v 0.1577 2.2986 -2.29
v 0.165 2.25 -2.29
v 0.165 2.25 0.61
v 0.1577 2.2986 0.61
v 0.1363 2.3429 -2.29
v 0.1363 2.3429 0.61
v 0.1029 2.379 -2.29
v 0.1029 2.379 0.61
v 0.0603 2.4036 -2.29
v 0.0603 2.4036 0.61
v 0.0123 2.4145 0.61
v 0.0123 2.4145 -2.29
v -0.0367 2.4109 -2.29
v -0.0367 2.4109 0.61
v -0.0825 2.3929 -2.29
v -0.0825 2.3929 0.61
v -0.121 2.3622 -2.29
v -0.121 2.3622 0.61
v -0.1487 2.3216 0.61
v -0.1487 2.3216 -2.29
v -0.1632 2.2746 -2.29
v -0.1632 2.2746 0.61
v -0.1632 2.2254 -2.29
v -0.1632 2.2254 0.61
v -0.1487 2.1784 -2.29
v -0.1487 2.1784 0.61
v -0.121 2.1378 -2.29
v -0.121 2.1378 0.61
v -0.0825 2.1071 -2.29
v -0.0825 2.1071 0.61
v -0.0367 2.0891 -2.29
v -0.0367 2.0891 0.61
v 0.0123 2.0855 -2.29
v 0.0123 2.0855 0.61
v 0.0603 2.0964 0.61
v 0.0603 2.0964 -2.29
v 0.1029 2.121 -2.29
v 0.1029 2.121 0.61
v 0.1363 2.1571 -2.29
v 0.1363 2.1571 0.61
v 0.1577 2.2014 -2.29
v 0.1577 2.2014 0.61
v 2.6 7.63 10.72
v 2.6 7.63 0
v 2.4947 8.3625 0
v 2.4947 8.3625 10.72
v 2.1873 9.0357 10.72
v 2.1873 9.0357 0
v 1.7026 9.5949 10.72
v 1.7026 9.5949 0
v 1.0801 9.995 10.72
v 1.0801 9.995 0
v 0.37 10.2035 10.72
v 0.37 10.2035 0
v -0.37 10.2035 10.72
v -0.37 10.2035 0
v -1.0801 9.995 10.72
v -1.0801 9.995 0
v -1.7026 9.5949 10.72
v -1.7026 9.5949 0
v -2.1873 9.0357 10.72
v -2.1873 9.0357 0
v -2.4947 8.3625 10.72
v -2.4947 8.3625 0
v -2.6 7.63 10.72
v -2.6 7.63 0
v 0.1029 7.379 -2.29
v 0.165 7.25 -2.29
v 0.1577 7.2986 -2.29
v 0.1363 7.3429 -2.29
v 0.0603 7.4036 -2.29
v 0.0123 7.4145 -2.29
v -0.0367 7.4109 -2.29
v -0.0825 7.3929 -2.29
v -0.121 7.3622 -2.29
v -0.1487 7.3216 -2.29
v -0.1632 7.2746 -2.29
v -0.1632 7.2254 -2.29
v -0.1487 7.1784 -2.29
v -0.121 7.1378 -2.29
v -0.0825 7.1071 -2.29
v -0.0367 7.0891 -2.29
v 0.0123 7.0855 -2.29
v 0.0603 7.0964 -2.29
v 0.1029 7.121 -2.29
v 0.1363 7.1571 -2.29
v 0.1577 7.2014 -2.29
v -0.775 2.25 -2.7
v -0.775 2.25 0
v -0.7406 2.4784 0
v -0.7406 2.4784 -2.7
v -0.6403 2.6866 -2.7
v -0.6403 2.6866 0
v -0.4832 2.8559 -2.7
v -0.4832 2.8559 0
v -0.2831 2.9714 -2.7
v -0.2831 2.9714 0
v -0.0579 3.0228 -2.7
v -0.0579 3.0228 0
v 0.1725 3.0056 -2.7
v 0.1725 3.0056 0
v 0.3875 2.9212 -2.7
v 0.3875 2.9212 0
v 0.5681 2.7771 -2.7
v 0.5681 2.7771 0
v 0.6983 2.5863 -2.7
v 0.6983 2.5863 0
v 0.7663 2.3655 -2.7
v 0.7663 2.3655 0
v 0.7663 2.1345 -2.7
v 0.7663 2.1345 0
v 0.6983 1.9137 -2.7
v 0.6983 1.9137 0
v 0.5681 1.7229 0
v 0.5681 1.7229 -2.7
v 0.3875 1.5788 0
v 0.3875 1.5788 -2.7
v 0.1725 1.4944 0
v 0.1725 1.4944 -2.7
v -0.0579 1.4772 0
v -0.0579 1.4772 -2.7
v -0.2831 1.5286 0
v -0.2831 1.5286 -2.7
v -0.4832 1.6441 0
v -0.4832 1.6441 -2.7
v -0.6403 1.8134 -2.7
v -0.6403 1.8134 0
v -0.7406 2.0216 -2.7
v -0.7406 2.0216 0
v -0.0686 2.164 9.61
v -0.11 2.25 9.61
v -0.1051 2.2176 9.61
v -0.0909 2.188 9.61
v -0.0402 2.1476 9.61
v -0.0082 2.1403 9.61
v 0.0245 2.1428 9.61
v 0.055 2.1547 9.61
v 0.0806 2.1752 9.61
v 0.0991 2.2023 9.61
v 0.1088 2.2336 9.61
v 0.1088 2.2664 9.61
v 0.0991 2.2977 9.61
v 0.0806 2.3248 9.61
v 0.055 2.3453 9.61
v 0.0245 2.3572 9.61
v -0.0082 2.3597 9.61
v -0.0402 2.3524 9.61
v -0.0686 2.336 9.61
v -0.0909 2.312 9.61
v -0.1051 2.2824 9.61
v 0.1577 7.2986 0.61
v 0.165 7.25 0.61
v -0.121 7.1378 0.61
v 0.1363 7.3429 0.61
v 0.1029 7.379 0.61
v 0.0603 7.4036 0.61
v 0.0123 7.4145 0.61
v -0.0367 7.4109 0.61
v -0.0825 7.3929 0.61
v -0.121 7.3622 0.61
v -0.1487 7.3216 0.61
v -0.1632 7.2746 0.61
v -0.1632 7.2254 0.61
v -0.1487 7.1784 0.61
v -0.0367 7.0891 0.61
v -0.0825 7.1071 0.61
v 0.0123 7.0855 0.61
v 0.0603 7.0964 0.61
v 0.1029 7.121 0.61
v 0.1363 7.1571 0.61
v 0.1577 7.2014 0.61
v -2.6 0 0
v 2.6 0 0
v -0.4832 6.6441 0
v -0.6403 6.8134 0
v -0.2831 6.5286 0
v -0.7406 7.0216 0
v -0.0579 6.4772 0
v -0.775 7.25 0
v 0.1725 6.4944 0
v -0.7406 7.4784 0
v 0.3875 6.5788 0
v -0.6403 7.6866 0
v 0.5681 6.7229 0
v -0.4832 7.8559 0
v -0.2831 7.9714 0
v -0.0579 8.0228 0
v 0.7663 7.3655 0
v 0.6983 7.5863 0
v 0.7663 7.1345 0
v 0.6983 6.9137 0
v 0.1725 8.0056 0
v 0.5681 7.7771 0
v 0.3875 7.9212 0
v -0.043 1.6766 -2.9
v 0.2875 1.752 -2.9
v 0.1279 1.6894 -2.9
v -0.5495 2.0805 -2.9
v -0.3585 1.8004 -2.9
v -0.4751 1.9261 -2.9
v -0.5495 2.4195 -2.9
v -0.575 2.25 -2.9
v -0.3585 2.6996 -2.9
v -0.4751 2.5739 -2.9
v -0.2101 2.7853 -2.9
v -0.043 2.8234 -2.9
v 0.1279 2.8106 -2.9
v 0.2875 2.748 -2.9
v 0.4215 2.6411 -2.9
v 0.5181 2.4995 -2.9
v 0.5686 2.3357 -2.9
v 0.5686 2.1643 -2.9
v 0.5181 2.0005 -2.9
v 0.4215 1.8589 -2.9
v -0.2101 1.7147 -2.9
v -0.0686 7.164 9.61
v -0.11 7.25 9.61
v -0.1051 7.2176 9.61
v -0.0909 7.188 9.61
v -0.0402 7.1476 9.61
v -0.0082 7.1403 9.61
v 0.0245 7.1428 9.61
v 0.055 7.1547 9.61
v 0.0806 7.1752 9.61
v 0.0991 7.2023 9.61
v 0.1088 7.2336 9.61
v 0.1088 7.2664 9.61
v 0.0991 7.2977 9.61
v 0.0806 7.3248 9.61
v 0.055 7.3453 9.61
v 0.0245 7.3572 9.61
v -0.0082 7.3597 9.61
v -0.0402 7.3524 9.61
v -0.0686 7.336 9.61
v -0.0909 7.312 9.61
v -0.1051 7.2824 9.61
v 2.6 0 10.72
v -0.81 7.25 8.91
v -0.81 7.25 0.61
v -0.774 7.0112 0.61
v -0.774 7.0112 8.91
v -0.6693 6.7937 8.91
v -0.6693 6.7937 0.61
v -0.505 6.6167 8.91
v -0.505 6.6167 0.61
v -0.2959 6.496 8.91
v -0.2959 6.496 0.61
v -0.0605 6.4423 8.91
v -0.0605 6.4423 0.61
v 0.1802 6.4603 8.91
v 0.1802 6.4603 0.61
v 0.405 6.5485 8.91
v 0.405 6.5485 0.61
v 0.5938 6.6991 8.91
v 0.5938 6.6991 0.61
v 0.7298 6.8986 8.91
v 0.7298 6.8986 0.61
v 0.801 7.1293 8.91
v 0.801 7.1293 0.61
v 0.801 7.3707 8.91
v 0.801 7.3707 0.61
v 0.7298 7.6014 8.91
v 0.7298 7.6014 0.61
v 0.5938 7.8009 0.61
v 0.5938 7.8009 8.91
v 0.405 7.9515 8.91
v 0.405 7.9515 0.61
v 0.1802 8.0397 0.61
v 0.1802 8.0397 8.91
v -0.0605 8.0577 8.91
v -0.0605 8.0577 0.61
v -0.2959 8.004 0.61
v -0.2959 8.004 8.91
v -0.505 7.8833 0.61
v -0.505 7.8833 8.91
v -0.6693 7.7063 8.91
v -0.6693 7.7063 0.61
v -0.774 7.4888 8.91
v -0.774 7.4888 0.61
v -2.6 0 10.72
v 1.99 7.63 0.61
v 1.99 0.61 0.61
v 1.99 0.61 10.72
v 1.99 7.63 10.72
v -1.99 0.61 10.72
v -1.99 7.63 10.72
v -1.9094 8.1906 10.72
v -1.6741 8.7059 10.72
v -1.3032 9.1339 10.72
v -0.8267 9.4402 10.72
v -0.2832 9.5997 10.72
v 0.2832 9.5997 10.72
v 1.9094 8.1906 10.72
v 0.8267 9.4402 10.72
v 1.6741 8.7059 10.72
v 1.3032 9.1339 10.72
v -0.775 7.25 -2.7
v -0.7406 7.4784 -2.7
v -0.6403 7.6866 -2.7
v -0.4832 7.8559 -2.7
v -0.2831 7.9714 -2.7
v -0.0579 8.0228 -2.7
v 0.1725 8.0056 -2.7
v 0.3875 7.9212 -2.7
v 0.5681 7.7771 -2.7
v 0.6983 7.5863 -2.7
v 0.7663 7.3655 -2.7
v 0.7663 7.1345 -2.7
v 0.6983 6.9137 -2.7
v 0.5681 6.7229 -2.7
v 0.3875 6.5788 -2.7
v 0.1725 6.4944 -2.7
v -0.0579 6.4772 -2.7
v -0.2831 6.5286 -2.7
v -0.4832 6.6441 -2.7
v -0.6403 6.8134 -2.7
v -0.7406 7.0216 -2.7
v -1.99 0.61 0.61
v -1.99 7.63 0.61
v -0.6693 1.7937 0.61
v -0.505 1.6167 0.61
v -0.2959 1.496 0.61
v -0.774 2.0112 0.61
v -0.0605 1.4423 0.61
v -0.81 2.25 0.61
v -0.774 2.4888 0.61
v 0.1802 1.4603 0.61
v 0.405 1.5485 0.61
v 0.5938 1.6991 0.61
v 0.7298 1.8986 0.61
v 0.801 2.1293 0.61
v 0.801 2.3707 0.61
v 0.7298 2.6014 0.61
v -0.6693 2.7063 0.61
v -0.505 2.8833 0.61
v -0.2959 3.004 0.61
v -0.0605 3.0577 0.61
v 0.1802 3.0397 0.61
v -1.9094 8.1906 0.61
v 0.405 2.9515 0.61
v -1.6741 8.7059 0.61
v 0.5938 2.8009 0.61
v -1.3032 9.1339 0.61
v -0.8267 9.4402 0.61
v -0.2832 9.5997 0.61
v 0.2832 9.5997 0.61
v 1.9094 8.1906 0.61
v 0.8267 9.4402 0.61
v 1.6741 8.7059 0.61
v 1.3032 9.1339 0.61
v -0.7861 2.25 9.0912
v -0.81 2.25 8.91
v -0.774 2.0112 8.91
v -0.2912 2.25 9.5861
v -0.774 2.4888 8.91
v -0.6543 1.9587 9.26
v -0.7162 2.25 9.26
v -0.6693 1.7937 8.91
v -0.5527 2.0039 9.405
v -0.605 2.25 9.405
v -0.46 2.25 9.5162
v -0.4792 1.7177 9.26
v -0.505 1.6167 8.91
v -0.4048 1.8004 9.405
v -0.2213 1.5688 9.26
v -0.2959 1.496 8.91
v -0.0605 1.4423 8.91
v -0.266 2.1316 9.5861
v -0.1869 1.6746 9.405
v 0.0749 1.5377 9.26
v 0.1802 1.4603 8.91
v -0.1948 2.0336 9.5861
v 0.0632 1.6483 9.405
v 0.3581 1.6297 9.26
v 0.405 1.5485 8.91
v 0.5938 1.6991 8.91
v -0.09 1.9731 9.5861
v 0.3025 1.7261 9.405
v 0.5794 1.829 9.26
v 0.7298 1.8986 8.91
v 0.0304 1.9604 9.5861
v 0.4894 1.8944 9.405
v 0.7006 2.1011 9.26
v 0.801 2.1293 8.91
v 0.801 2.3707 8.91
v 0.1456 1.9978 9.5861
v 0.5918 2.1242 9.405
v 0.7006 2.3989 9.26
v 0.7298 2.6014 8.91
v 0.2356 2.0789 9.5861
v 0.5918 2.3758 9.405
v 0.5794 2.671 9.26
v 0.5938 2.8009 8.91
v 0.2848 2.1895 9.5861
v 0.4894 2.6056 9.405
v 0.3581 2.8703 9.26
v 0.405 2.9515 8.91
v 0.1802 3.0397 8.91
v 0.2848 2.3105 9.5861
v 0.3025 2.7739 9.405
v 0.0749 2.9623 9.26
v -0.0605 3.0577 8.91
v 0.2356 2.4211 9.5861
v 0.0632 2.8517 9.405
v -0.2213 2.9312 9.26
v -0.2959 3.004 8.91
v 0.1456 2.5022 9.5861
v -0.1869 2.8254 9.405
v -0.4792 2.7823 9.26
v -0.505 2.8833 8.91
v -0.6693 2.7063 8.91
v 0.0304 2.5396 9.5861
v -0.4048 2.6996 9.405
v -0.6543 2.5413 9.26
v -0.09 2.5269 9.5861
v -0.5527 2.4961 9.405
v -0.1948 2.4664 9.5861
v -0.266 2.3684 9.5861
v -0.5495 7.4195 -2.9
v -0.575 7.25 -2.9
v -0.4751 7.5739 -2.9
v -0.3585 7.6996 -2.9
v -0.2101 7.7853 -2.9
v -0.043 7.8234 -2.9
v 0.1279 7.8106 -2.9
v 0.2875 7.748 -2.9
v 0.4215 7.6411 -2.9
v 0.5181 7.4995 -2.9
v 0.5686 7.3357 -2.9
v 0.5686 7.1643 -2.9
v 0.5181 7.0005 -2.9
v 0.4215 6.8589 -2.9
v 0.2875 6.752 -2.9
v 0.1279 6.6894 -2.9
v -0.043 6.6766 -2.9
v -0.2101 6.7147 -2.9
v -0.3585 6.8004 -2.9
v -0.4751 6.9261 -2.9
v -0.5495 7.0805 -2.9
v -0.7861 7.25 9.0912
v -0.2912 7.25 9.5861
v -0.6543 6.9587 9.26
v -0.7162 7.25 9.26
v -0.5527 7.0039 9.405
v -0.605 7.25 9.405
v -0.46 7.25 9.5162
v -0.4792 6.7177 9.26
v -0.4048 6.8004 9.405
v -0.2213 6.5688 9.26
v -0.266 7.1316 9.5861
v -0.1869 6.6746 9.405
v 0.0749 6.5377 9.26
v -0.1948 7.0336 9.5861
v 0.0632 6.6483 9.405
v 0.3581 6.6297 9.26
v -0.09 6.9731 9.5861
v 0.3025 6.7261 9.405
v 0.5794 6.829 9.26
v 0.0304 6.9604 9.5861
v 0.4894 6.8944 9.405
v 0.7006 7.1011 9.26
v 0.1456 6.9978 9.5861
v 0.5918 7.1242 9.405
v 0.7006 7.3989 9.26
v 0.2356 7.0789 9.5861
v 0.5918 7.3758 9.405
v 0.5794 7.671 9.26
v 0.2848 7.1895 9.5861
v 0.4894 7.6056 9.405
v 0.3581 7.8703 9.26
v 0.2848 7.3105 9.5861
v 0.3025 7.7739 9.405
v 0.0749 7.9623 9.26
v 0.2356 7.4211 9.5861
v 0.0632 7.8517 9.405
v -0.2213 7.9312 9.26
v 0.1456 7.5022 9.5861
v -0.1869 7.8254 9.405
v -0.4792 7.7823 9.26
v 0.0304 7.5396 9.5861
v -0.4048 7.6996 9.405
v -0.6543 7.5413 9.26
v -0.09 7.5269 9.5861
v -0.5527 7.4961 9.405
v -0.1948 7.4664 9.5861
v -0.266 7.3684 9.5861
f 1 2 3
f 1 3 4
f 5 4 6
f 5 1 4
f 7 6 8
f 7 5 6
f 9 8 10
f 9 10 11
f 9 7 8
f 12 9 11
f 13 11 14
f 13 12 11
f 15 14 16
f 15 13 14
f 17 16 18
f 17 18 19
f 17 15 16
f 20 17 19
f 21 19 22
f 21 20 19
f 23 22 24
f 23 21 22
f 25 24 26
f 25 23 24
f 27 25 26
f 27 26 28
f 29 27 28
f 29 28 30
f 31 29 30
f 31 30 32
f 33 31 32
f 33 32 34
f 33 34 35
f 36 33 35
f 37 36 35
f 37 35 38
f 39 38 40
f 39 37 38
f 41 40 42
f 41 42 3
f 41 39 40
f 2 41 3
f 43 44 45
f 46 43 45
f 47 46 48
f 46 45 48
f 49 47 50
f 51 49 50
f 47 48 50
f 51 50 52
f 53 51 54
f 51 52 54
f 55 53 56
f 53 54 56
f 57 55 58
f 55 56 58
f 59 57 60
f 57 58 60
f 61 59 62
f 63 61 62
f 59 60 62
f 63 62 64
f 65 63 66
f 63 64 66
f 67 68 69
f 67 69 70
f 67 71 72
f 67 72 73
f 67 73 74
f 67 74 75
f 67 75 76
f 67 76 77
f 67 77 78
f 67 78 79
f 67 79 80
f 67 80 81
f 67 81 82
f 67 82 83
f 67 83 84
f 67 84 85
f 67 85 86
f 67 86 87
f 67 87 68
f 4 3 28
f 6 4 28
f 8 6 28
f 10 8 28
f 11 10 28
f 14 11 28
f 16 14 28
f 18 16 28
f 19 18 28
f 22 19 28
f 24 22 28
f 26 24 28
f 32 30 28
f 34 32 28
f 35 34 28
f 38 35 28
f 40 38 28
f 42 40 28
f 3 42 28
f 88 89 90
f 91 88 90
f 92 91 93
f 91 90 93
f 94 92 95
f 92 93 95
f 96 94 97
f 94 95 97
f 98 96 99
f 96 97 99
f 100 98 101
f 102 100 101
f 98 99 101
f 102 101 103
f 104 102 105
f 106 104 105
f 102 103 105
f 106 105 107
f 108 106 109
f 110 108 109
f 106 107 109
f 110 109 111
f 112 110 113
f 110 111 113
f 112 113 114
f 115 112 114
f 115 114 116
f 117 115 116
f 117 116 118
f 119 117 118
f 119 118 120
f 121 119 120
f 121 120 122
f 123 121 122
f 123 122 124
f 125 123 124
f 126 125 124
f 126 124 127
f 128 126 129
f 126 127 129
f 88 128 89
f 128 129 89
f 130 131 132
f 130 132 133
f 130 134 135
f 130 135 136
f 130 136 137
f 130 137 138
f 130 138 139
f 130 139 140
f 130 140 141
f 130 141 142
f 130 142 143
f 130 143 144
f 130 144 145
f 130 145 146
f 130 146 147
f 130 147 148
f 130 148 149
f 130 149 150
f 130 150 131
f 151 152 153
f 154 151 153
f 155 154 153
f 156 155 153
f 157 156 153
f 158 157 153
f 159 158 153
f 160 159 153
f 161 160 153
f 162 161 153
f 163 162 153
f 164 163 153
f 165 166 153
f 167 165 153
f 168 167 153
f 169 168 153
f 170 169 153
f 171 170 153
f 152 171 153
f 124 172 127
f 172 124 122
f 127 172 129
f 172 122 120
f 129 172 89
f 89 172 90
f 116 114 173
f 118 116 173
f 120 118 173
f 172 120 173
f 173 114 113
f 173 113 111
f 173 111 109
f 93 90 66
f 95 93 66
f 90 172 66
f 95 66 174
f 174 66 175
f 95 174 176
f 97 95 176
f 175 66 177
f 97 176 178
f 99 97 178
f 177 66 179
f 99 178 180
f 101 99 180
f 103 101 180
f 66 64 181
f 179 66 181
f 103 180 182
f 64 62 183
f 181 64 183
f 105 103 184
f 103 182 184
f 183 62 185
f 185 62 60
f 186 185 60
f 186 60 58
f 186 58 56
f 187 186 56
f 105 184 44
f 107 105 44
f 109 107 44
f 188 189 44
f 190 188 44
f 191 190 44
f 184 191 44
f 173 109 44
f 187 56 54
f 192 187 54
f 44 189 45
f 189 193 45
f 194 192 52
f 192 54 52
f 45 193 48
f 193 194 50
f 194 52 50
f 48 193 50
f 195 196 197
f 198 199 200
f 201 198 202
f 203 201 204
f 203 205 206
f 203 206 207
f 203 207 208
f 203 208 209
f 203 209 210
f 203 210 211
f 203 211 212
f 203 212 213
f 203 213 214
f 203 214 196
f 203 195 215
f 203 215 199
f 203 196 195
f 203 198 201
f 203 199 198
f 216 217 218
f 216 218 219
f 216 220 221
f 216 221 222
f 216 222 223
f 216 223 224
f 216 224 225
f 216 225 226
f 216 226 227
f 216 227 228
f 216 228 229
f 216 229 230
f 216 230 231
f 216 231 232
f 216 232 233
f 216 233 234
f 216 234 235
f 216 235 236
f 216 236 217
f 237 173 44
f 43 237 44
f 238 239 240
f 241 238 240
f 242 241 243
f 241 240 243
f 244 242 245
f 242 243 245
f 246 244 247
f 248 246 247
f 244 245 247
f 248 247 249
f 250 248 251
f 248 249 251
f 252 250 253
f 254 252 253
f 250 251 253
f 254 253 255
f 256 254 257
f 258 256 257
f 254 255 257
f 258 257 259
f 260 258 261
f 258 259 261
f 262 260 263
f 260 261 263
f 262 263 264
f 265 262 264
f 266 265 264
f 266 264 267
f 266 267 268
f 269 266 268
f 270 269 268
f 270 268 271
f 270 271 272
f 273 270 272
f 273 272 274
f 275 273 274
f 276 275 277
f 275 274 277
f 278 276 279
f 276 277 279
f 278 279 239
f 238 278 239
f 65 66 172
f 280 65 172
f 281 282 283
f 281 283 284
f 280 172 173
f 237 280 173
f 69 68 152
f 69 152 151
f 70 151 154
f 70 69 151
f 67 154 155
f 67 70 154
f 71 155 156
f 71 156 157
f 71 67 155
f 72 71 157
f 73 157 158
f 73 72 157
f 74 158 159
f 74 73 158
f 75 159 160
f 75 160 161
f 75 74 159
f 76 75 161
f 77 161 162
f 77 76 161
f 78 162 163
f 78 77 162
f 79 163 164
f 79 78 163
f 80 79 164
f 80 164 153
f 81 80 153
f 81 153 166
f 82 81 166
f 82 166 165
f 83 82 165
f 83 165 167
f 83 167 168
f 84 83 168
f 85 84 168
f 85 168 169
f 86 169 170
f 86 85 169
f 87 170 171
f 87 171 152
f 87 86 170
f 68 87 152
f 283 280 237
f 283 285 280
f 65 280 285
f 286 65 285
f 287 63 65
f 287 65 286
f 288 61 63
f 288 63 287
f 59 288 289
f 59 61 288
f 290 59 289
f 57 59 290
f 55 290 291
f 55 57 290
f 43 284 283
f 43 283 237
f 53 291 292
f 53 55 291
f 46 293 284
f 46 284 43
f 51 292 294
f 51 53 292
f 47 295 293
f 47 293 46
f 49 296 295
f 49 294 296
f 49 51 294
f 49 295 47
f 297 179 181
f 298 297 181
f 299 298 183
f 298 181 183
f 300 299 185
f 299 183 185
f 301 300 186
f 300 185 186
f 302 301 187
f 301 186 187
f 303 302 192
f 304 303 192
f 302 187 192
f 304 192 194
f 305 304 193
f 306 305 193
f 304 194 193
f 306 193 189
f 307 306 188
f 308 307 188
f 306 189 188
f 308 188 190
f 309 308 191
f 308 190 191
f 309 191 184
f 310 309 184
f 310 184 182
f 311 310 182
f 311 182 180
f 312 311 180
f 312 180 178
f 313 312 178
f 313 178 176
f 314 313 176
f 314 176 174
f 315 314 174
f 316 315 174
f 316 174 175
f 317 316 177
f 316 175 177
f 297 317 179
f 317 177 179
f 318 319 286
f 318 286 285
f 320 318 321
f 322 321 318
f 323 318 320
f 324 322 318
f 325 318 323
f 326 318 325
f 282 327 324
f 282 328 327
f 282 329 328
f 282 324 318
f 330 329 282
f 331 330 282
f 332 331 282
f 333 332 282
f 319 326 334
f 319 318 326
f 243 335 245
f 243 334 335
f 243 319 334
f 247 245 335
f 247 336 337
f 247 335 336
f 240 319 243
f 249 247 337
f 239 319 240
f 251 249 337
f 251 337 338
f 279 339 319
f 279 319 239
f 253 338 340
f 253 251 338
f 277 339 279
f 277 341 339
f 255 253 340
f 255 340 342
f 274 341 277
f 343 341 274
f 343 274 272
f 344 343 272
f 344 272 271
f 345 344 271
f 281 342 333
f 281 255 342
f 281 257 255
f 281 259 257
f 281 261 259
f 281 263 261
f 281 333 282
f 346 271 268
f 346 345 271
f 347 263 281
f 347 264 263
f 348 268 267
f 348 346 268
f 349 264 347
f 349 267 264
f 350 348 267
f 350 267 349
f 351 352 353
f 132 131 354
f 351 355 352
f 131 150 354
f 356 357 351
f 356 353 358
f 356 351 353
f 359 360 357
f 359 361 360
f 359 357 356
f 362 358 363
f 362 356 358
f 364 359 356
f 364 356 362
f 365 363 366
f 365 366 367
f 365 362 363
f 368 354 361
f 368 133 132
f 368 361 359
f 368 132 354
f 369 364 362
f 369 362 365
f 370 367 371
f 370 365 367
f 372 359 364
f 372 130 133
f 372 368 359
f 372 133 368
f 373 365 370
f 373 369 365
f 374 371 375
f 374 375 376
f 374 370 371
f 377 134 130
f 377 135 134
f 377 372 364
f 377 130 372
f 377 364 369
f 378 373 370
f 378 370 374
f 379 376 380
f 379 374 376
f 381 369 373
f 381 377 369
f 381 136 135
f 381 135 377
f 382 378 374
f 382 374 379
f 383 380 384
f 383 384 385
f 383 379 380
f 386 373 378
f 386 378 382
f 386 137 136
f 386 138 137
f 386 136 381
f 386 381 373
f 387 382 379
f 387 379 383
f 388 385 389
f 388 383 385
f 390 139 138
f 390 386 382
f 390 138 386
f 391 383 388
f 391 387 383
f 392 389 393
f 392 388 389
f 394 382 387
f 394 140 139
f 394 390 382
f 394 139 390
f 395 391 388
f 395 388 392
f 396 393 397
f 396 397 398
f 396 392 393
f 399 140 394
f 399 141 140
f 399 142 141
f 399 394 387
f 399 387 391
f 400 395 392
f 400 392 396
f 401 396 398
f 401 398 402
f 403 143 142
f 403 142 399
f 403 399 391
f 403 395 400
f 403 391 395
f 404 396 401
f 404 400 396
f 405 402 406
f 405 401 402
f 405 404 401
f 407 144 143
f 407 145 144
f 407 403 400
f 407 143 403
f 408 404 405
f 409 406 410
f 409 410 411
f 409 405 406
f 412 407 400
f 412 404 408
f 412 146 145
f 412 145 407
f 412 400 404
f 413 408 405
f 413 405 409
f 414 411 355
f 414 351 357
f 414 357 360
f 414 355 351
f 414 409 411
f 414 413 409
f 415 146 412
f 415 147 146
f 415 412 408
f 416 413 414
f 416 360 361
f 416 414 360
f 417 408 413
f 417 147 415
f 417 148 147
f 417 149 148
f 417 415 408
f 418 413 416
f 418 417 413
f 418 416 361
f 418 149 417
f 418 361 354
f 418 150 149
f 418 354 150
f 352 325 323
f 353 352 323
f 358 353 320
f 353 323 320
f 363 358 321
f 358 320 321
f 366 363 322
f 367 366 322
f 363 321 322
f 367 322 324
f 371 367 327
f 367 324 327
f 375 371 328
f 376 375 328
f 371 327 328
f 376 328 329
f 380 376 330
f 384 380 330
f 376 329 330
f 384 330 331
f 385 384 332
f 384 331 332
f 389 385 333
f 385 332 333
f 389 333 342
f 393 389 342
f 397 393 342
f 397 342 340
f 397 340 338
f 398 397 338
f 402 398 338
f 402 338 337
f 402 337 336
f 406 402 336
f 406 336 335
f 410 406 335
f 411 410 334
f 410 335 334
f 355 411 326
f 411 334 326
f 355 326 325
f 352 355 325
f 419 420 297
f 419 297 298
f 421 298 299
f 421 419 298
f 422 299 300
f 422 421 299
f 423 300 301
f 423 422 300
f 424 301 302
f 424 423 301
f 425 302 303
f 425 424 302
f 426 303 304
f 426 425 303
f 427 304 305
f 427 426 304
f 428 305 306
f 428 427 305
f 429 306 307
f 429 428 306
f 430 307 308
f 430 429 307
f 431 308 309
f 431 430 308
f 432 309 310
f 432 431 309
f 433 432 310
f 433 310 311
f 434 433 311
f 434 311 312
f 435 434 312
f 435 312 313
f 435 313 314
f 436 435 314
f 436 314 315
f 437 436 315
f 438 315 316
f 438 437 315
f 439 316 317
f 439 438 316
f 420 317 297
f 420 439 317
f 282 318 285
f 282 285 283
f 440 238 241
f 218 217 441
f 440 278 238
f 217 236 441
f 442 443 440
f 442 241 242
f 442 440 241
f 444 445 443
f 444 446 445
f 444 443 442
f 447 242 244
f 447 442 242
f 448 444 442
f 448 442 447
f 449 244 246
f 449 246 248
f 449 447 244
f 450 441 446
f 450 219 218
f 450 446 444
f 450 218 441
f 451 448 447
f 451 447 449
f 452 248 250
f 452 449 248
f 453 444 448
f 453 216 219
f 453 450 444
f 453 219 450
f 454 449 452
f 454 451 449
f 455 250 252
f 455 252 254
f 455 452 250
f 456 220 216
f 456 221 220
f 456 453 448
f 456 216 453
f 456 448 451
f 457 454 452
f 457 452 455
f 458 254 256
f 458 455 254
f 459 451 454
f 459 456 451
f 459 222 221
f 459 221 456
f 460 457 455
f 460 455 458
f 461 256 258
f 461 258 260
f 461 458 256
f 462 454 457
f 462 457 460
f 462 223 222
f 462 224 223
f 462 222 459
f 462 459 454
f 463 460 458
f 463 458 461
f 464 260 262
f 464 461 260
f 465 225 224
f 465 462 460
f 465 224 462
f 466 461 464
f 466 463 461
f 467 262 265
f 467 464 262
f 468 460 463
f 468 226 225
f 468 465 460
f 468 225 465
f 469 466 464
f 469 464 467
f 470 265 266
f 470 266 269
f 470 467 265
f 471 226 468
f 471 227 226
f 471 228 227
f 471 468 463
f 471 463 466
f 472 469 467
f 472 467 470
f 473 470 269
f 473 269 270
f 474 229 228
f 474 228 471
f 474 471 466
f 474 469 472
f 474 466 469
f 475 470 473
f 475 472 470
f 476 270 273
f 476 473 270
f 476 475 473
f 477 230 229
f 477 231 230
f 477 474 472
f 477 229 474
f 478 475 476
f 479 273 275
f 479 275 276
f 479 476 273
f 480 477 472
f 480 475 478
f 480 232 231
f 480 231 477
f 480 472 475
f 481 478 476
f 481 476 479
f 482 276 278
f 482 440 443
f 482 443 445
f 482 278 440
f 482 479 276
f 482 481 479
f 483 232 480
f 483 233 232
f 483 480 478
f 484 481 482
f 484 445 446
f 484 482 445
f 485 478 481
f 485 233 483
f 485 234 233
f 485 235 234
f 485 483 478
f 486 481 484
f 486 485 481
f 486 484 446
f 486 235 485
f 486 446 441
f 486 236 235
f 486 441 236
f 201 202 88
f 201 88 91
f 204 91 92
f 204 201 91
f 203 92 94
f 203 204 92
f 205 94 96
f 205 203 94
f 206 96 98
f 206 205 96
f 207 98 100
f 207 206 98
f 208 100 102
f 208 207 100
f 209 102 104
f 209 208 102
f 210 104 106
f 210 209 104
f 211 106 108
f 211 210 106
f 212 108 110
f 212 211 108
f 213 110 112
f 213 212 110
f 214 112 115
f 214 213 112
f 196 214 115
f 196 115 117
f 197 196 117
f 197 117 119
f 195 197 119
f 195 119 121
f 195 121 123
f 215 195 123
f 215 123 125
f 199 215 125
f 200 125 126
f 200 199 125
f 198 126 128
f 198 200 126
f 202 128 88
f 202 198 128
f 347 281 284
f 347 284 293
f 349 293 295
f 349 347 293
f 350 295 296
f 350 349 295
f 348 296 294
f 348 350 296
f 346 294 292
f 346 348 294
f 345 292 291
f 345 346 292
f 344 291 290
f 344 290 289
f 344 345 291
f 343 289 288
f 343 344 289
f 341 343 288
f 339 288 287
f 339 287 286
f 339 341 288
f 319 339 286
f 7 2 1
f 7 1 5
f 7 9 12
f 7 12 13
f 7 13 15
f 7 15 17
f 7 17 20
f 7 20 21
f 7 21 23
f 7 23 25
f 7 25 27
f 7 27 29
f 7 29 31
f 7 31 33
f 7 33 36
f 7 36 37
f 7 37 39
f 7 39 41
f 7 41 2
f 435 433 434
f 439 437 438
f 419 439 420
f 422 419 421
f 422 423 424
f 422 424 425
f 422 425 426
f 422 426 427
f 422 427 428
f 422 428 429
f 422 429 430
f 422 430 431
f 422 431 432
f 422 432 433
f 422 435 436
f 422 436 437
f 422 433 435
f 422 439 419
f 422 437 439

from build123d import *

# Parameters (mm, degrees)
SALIENTE_EXTRUIR1_DEPTH = 10.72
CROQUIS2_R              = 0.775
SALIENTE_EXTRUIR2_DEPTH = 2.9
CHAFL_N1_SIZE           = 0.2
VACIADO1_START          = 0.61
VACIADO1_DEPTH          = 10.11
VACIADO1_START_2        = -2.29
VACIADO1_2_OUTLINE_R    = 0.165
VACIADO1_2_DEPTH        = 2.9
CROQUIS4_R              = 0.81
SALIENTE_EXTRUIR4_DEPTH = 9
REDONDEO1_R             = 0.7


# Read off the part's stored shape, not the designer's step: Vaciado1
with BuildPart() as part:
    # Croquis1 → Saliente-Extruir1 (new body)
    with BuildSketch(Plane.XY):
        with BuildLine():
            Line((-2.6, 7.63), (-2.6, 0))
            Line((-2.6, 0), (2.6, 0))
            Line((2.6, 0), (2.6, 7.63))
            ThreePointArc((2.6, 7.63), (0, 10.23), (-2.6, 7.63))
        make_face()
    extrude(amount=SALIENTE_EXTRUIR1_DEPTH)

    # Croquis2 → Saliente-Extruir2 (add)
    with BuildSketch(Plane(origin=(0, 0, 0), x_dir=(-1, 0, 0), z_dir=(0, 0, -1))):
        with Locations((0, 7.25)):
            Circle(CROQUIS2_R)
        with Locations((0, 2.25)):
            Circle(CROQUIS2_R)
    extrude(amount=SALIENTE_EXTRUIR2_DEPTH)

    # Chaflán1
    chafl_n1_edges = [part.edges().sort_by_distance(p)[0] for p in [
        (0.775, 7.25, -2.9),
        (0.775, 2.25, -2.9),
    ]]
    chamfer(chafl_n1_edges, length=CHAFL_N1_SIZE)

    # Vaciado1 outline → Vaciado1 (cut)
    with BuildSketch(Plane.XY.offset(VACIADO1_START)):
        with BuildLine():
            ThreePointArc((1.99, 7.63), (0, 9.62), (-1.99, 7.63))
            Line((-1.99, 7.63), (-1.99, 0.61))
            Line((-1.99, 0.61), (1.99, 0.61))
            Line((1.99, 0.61), (1.99, 7.63))
        make_face()
    extrude(amount=VACIADO1_DEPTH, mode=Mode.SUBTRACT)

    # Vaciado1 2 outline → Vaciado1 2 (cut)
    with BuildSketch(Plane.XY.offset(VACIADO1_START_2)):
        with Locations((0, 7.25)):
            Circle(VACIADO1_2_OUTLINE_R)
        with Locations((0, 2.25)):
            Circle(VACIADO1_2_OUTLINE_R)
    extrude(amount=VACIADO1_2_DEPTH, mode=Mode.SUBTRACT)

    # Croquis4 → Saliente-Extruir4 (add)
    with BuildSketch(Plane.XY.offset(0.61)):
        with Locations(Location((0, 2.25, 0), (0, 0, 180))):
            Circle(CROQUIS4_R)
        with Locations(Location((0, 7.25, 0), (0, 0, 180))):
            Circle(CROQUIS4_R)
    extrude(amount=SALIENTE_EXTRUIR4_DEPTH)

    # Redondeo1
    redondeo1_edges = [part.edges().sort_by_distance(p)[0] for p in [
        (0.81, 2.25, 9.61),
        (0.81, 7.25, 9.61),
    ]]
    fillet(redondeo1_edges, radius=REDONDEO1_R)


solid = part.part
